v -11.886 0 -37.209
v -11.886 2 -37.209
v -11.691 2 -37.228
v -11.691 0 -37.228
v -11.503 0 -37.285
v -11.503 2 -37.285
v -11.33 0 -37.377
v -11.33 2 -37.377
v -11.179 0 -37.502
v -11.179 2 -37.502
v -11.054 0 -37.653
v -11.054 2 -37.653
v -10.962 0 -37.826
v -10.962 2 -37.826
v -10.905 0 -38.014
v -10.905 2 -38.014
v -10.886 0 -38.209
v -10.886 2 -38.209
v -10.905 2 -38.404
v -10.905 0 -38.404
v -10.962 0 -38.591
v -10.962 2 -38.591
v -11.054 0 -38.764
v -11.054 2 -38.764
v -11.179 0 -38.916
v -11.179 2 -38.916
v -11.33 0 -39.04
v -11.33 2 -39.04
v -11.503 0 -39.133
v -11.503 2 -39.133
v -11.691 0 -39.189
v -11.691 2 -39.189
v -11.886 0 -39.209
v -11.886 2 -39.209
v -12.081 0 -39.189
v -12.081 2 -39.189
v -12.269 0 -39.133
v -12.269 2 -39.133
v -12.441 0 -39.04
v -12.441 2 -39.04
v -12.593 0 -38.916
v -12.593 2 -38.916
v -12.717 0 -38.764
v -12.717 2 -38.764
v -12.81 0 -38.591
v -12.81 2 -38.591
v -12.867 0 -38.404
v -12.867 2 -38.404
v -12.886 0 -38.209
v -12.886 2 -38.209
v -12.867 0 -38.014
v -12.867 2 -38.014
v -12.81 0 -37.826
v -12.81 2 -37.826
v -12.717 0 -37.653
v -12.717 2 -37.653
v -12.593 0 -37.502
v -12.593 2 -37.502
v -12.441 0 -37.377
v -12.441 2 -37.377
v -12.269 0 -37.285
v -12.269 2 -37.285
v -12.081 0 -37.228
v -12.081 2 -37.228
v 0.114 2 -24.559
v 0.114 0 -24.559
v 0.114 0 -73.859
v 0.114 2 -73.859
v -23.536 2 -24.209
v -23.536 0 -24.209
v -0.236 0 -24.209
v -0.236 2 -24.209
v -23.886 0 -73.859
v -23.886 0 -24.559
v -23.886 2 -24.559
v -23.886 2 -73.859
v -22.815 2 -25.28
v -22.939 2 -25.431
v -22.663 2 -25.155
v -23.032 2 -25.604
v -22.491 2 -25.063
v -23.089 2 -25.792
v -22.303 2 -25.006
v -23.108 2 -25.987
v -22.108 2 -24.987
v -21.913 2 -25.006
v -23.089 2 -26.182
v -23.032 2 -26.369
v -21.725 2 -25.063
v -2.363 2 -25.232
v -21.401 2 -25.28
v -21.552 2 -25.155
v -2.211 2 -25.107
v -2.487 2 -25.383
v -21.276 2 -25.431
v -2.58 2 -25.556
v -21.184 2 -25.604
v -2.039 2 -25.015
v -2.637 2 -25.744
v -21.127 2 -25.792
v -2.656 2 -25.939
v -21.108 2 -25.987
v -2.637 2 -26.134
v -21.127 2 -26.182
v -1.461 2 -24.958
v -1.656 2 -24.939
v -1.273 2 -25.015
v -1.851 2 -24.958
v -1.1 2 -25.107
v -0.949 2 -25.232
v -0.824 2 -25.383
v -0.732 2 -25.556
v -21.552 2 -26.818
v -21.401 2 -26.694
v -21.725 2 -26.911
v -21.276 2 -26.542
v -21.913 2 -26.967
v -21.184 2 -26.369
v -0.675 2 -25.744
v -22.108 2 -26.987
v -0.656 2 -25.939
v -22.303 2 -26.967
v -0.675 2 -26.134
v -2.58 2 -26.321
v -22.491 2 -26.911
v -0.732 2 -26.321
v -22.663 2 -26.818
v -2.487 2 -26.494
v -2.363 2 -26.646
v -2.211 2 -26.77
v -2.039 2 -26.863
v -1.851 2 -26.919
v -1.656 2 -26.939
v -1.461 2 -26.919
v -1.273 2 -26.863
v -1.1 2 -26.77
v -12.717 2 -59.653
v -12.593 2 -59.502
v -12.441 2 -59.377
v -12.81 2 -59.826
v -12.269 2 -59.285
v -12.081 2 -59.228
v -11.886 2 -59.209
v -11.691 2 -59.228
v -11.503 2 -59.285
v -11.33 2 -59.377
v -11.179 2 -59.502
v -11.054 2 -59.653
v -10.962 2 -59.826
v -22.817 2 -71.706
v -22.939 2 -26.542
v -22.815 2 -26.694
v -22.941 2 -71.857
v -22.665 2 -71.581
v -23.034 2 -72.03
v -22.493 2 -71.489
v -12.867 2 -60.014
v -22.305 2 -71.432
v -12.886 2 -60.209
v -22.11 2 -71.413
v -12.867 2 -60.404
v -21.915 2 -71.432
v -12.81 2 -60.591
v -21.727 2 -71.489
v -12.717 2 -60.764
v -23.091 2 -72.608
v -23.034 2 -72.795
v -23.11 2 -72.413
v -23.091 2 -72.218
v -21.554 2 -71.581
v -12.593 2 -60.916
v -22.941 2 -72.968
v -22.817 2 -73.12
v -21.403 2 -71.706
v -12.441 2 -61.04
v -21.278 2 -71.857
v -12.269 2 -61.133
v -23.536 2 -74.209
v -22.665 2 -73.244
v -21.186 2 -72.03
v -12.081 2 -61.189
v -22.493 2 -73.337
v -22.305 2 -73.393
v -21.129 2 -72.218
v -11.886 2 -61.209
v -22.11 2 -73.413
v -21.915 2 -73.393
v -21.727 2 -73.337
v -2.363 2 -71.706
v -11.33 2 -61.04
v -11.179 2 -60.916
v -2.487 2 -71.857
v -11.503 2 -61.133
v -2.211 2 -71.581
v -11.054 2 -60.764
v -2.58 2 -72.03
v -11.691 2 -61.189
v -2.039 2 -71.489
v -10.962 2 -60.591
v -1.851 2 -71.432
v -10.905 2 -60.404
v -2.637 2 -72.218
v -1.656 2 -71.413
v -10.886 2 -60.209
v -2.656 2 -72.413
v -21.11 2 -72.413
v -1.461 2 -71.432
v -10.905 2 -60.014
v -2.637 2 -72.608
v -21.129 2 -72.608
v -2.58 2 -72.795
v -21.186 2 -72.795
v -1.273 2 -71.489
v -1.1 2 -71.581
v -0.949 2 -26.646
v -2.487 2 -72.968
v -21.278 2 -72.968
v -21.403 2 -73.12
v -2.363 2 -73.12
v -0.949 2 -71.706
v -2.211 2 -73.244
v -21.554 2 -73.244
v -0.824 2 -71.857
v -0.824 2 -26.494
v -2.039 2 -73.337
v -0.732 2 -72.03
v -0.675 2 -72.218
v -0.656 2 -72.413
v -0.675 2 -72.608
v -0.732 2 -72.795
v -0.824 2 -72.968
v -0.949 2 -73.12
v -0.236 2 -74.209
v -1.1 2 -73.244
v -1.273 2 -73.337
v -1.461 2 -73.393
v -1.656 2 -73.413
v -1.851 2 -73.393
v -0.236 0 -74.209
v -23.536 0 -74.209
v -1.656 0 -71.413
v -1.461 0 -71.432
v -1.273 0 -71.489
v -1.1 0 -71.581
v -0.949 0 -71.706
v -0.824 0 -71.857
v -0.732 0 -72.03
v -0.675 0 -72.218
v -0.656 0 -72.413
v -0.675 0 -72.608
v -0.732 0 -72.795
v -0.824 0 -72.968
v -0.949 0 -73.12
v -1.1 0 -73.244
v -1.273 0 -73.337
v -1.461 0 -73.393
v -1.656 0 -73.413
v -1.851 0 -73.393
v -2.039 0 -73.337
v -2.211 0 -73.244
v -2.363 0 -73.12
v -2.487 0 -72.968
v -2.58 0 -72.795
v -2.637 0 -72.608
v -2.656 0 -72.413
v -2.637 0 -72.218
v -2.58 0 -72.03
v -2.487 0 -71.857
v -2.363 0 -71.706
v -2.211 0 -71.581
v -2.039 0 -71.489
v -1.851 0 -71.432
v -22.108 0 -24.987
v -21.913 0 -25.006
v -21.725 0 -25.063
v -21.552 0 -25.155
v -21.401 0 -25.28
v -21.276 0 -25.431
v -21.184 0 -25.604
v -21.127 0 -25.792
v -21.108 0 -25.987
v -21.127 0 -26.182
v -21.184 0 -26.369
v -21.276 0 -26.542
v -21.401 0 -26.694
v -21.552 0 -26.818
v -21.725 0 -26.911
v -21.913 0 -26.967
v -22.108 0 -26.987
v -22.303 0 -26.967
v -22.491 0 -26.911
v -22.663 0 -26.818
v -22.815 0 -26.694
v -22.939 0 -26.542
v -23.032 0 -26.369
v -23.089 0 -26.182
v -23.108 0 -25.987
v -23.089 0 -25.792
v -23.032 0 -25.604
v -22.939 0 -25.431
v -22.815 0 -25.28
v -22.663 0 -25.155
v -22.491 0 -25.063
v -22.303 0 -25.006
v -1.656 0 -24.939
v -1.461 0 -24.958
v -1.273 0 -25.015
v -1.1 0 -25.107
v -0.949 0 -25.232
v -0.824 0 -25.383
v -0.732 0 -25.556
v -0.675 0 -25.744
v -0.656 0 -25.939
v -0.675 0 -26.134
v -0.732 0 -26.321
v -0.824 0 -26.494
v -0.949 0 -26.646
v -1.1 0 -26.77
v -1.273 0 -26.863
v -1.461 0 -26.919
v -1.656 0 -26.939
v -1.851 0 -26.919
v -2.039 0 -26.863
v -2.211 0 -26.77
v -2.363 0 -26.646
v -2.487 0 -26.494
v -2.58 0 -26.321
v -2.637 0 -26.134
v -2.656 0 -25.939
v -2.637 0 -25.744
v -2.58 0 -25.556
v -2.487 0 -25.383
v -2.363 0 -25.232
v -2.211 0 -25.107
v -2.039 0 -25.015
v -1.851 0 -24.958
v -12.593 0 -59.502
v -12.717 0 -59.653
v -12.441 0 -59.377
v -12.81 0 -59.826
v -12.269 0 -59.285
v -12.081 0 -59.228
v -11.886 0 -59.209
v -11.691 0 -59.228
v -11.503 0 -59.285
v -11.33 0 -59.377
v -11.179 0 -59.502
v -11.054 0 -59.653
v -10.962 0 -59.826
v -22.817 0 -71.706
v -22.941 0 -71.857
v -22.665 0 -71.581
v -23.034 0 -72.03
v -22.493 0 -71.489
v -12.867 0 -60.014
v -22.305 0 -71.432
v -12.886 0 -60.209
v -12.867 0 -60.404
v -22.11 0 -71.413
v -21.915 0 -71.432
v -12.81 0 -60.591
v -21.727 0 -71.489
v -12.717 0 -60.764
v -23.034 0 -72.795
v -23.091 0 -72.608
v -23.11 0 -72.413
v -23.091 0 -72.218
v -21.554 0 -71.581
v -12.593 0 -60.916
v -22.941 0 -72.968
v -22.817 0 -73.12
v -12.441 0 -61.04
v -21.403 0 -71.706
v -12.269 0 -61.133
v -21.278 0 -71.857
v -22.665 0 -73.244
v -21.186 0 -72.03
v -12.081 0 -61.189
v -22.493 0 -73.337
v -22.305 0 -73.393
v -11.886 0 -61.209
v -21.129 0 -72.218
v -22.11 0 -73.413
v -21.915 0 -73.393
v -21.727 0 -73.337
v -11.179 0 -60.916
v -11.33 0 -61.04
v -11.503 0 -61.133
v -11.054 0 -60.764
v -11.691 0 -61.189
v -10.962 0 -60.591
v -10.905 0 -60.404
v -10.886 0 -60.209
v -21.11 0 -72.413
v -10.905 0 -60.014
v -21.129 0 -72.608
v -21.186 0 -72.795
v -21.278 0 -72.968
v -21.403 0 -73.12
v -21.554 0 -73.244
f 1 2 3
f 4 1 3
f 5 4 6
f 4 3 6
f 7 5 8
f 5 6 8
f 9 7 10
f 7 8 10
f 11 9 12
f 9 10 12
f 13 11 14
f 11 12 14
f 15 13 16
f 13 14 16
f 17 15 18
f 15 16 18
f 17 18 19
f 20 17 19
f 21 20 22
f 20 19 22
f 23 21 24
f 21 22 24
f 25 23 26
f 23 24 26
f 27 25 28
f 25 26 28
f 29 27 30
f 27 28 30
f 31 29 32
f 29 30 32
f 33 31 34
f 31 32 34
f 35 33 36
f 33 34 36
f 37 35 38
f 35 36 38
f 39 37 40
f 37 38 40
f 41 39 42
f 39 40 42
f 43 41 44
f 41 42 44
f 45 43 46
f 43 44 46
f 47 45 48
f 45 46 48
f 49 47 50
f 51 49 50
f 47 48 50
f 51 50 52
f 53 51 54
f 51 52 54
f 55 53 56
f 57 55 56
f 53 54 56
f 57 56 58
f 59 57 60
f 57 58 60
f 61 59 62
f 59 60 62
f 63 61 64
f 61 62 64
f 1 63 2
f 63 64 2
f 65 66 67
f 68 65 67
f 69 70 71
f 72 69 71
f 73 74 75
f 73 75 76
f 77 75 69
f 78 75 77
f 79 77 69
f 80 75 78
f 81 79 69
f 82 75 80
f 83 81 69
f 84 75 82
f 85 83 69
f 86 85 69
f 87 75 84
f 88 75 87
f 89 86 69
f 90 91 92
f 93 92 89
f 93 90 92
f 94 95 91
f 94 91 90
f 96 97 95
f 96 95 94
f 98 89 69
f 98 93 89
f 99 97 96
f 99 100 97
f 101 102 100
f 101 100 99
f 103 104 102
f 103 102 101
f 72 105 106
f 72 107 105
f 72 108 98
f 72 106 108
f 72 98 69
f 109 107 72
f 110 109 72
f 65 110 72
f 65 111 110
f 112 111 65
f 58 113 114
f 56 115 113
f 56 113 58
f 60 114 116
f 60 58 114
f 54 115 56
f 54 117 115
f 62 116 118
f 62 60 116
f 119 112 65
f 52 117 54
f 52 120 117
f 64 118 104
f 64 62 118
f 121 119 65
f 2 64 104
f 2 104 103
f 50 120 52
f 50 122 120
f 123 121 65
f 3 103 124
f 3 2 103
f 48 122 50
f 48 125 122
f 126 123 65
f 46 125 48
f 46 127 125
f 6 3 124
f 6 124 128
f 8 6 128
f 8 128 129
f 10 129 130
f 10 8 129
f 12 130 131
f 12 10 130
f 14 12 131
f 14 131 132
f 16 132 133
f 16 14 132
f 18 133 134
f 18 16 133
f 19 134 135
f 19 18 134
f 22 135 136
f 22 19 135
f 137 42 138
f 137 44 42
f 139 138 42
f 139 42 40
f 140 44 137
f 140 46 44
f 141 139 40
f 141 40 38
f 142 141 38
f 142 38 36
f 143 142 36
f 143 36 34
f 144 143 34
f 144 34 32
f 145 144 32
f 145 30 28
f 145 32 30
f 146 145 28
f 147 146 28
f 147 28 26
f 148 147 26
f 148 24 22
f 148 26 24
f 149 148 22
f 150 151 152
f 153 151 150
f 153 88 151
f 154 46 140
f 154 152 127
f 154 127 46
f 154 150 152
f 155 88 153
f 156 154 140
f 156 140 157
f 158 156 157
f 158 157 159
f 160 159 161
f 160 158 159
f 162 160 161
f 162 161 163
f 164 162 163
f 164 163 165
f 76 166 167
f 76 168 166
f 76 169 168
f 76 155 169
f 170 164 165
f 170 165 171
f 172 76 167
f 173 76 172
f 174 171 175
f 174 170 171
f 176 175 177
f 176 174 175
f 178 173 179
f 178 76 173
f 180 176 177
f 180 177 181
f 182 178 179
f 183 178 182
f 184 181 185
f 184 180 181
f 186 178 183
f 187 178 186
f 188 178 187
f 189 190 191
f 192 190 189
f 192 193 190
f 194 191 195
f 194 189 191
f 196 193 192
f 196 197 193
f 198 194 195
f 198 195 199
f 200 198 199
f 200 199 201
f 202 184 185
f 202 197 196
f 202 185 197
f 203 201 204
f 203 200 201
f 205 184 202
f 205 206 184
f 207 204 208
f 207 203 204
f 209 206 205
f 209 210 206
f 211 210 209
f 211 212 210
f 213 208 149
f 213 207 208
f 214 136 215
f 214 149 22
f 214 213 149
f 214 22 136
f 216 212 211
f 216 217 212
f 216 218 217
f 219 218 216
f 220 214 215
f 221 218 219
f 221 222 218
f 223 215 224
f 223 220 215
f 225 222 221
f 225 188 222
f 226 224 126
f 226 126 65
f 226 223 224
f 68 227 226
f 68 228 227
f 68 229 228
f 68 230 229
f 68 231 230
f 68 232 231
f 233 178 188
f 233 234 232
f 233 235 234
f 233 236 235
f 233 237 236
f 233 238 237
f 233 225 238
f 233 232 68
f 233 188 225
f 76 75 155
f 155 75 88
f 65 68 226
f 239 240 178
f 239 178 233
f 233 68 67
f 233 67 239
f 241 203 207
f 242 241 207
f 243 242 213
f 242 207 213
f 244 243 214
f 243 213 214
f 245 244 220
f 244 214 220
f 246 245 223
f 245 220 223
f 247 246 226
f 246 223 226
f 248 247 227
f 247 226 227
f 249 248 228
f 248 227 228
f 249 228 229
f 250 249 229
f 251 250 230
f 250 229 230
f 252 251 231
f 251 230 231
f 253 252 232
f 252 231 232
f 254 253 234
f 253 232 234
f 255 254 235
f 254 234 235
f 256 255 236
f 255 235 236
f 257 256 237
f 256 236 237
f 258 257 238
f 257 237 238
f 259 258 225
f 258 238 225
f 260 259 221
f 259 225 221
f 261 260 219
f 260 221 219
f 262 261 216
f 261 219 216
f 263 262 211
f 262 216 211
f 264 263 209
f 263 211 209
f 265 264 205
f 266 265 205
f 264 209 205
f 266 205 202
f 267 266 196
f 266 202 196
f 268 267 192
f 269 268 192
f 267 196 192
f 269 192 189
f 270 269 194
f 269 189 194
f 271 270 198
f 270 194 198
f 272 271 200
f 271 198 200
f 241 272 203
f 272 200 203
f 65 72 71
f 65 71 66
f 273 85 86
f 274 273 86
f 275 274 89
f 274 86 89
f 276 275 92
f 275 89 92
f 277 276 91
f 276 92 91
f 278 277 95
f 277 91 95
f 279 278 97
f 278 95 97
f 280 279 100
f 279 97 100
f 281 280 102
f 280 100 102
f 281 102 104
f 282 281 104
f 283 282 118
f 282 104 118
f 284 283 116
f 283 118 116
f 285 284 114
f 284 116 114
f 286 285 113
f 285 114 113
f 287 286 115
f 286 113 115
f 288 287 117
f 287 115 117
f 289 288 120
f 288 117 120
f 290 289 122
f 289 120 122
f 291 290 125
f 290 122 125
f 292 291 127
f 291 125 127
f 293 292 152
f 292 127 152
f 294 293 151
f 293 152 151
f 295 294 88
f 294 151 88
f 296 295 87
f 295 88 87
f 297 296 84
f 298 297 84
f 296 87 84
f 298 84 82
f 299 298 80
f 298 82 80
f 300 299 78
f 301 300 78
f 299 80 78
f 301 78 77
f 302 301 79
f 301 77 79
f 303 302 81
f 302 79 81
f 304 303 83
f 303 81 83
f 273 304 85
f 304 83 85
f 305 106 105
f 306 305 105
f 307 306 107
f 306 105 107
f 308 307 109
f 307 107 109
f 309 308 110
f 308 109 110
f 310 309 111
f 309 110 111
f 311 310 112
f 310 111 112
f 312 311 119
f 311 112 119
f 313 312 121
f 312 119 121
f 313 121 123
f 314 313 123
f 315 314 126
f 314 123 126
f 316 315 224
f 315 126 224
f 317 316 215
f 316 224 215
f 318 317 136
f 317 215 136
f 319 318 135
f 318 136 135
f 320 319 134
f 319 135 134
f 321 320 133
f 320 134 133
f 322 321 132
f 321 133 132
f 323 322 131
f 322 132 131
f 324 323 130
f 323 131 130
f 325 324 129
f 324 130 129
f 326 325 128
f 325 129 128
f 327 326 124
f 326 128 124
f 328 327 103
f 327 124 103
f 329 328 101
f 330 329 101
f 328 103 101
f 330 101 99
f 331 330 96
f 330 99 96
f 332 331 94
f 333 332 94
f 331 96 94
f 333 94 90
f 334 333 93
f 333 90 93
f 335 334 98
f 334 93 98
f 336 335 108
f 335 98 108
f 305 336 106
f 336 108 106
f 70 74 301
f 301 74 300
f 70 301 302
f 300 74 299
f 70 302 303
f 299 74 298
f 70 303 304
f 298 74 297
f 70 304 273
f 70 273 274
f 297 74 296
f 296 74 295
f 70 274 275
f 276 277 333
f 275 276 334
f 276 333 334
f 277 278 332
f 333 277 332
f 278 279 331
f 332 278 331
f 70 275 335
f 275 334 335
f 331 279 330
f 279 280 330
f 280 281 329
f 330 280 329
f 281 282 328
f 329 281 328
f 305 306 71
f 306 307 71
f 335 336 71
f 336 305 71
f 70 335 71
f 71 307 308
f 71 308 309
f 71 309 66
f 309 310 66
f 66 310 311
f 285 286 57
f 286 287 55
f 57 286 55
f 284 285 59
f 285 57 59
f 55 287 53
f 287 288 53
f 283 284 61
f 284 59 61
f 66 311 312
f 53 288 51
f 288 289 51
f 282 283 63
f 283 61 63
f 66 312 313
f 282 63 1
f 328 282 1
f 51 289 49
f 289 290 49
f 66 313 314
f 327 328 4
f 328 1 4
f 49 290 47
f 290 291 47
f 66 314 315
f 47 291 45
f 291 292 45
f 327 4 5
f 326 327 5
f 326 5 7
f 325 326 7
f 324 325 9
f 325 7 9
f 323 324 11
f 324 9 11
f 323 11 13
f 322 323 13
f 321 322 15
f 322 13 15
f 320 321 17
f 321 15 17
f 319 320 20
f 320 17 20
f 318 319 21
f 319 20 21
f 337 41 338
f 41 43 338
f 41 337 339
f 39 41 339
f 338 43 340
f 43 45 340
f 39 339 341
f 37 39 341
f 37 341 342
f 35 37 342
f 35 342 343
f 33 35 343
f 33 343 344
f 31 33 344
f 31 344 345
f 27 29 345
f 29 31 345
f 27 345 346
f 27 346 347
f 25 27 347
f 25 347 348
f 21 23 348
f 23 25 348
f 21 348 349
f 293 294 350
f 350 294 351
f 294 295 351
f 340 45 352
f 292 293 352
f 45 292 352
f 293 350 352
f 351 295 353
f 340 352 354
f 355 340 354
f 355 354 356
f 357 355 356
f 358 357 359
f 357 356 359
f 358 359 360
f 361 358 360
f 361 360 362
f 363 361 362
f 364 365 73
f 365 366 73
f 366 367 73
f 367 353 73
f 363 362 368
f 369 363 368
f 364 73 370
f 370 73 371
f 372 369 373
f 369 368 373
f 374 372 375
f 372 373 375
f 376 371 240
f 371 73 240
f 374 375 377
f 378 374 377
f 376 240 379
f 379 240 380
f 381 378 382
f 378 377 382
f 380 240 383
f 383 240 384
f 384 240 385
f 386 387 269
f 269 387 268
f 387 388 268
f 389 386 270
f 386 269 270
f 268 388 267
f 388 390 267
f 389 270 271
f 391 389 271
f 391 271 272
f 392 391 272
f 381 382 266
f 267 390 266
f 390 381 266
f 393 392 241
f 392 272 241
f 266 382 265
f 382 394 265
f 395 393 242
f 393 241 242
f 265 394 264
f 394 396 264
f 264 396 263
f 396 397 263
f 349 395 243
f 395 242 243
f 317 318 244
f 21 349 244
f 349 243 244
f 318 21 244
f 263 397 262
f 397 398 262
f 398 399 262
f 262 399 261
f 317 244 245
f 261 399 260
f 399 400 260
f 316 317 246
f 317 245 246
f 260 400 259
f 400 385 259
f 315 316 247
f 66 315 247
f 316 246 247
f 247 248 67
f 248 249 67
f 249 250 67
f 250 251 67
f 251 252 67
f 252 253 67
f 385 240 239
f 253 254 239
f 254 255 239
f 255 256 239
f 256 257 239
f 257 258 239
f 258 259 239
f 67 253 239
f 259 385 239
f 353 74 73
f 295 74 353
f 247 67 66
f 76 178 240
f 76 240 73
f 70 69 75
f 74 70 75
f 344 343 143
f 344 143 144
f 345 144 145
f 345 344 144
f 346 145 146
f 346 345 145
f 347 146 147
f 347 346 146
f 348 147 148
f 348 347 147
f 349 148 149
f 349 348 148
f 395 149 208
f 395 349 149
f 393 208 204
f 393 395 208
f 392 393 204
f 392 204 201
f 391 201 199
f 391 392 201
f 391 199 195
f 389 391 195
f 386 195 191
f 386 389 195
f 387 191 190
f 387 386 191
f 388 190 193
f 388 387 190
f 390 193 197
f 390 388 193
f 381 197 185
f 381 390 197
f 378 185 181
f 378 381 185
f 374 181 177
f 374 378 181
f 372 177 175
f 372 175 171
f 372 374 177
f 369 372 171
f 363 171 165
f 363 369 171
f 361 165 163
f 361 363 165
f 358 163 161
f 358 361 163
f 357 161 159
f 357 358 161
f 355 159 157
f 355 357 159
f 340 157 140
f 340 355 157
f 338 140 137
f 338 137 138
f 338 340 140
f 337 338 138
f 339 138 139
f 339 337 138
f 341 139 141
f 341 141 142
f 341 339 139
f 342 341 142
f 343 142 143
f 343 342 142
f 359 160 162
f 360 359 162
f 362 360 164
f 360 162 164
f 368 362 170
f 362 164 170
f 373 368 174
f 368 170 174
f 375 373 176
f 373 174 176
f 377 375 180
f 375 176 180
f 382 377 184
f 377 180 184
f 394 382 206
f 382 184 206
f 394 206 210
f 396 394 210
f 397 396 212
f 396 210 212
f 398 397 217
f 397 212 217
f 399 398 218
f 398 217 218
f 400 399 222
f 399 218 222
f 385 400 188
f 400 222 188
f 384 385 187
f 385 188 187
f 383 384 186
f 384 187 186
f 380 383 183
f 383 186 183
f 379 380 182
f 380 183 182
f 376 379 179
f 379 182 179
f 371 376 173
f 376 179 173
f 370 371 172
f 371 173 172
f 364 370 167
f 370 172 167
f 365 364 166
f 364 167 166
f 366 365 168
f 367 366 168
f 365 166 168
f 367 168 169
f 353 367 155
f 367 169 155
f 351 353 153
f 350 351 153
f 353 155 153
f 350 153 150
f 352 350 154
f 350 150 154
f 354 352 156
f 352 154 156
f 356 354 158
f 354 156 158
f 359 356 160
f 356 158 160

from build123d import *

# Parameters (mm, degrees)
SKETCH_1_W          = 24
SKETCH_1_H          = 50
SKETCH_1_R          = 1
EXTRUDE_1_DEPTH     = 2
SKETCH_2_R          = 1
CUT_EXTRUDE_2_DEPTH = 2
CUT_EXTRUDE_3_DEPTH = 2


with BuildPart() as part:
    # 草图1 → 凸台-拉伸1 (new body)
    with BuildSketch(Plane(origin=(0, 0, 0), x_dir=(1, 0, 0), z_dir=(0, 1, 0))):
        with Locations((-11.885843957, 49.208625632)):
            Rectangle(SKETCH_1_W, SKETCH_1_H)
        with Locations(Location((-11.885843957, 60.208625632, 0), (0, 0, 270))):
            Circle(SKETCH_1_R, mode=Mode.SUBTRACT)
    extrude(amount=EXTRUDE_1_DEPTH)

    # 草图2 → 切除-拉伸2 (cut)
    with BuildSketch(Plane(origin=(0, 2, 0), x_dir=(1, 0, 0), z_dir=(0, 1, 0))):
        with Locations(Location((-11.885843957, 38.208625632, 0), (0, 0, 270))):
            Circle(SKETCH_2_R)
        with Locations(Location((-22.109843957, 72.412625632, 0), (0, 0, 270))):
            Circle(SKETCH_2_R)
        with Locations(Location((-1.655843957, 72.412625632, 0), (0, 0, 270))):
            Circle(SKETCH_2_R)
        with Locations(Location((-22.107843957, 25.986625632, 0), (0, 0, 270))):
            Circle(SKETCH_2_R)
        with Locations(Location((-1.655843957, 25.938625632, 0), (0, 0, 270))):
            Circle(SKETCH_2_R)
    extrude(amount=-CUT_EXTRUDE_2_DEPTH, mode=Mode.SUBTRACT)

    # 草图3 → 切除-拉伸3 (cut)
    with BuildSketch(Plane(origin=(0, 2, 0), x_dir=(1, 0, 0), z_dir=(0, 1, 0))):
        Polygon((-23.885843957, 74.208625632), (-23.535843957, 74.208625632), (-23.885843957, 73.858625632), align=None)
        Polygon((0.114156043, 74.208625632), (0.114156043, 73.858625632), (-0.235843957, 74.208625632), align=None)
        Polygon((0.114156043, 24.208625632), (-0.235843957, 24.208625632), (0.114156043, 24.558625632), align=None)
        Polygon((-23.885843957, 24.208625632), (-23.535843957, 24.208625632), (-23.885843957, 24.558625632), align=None)
    extrude(amount=-CUT_EXTRUDE_3_DEPTH, mode=Mode.SUBTRACT)


solid = part.part
